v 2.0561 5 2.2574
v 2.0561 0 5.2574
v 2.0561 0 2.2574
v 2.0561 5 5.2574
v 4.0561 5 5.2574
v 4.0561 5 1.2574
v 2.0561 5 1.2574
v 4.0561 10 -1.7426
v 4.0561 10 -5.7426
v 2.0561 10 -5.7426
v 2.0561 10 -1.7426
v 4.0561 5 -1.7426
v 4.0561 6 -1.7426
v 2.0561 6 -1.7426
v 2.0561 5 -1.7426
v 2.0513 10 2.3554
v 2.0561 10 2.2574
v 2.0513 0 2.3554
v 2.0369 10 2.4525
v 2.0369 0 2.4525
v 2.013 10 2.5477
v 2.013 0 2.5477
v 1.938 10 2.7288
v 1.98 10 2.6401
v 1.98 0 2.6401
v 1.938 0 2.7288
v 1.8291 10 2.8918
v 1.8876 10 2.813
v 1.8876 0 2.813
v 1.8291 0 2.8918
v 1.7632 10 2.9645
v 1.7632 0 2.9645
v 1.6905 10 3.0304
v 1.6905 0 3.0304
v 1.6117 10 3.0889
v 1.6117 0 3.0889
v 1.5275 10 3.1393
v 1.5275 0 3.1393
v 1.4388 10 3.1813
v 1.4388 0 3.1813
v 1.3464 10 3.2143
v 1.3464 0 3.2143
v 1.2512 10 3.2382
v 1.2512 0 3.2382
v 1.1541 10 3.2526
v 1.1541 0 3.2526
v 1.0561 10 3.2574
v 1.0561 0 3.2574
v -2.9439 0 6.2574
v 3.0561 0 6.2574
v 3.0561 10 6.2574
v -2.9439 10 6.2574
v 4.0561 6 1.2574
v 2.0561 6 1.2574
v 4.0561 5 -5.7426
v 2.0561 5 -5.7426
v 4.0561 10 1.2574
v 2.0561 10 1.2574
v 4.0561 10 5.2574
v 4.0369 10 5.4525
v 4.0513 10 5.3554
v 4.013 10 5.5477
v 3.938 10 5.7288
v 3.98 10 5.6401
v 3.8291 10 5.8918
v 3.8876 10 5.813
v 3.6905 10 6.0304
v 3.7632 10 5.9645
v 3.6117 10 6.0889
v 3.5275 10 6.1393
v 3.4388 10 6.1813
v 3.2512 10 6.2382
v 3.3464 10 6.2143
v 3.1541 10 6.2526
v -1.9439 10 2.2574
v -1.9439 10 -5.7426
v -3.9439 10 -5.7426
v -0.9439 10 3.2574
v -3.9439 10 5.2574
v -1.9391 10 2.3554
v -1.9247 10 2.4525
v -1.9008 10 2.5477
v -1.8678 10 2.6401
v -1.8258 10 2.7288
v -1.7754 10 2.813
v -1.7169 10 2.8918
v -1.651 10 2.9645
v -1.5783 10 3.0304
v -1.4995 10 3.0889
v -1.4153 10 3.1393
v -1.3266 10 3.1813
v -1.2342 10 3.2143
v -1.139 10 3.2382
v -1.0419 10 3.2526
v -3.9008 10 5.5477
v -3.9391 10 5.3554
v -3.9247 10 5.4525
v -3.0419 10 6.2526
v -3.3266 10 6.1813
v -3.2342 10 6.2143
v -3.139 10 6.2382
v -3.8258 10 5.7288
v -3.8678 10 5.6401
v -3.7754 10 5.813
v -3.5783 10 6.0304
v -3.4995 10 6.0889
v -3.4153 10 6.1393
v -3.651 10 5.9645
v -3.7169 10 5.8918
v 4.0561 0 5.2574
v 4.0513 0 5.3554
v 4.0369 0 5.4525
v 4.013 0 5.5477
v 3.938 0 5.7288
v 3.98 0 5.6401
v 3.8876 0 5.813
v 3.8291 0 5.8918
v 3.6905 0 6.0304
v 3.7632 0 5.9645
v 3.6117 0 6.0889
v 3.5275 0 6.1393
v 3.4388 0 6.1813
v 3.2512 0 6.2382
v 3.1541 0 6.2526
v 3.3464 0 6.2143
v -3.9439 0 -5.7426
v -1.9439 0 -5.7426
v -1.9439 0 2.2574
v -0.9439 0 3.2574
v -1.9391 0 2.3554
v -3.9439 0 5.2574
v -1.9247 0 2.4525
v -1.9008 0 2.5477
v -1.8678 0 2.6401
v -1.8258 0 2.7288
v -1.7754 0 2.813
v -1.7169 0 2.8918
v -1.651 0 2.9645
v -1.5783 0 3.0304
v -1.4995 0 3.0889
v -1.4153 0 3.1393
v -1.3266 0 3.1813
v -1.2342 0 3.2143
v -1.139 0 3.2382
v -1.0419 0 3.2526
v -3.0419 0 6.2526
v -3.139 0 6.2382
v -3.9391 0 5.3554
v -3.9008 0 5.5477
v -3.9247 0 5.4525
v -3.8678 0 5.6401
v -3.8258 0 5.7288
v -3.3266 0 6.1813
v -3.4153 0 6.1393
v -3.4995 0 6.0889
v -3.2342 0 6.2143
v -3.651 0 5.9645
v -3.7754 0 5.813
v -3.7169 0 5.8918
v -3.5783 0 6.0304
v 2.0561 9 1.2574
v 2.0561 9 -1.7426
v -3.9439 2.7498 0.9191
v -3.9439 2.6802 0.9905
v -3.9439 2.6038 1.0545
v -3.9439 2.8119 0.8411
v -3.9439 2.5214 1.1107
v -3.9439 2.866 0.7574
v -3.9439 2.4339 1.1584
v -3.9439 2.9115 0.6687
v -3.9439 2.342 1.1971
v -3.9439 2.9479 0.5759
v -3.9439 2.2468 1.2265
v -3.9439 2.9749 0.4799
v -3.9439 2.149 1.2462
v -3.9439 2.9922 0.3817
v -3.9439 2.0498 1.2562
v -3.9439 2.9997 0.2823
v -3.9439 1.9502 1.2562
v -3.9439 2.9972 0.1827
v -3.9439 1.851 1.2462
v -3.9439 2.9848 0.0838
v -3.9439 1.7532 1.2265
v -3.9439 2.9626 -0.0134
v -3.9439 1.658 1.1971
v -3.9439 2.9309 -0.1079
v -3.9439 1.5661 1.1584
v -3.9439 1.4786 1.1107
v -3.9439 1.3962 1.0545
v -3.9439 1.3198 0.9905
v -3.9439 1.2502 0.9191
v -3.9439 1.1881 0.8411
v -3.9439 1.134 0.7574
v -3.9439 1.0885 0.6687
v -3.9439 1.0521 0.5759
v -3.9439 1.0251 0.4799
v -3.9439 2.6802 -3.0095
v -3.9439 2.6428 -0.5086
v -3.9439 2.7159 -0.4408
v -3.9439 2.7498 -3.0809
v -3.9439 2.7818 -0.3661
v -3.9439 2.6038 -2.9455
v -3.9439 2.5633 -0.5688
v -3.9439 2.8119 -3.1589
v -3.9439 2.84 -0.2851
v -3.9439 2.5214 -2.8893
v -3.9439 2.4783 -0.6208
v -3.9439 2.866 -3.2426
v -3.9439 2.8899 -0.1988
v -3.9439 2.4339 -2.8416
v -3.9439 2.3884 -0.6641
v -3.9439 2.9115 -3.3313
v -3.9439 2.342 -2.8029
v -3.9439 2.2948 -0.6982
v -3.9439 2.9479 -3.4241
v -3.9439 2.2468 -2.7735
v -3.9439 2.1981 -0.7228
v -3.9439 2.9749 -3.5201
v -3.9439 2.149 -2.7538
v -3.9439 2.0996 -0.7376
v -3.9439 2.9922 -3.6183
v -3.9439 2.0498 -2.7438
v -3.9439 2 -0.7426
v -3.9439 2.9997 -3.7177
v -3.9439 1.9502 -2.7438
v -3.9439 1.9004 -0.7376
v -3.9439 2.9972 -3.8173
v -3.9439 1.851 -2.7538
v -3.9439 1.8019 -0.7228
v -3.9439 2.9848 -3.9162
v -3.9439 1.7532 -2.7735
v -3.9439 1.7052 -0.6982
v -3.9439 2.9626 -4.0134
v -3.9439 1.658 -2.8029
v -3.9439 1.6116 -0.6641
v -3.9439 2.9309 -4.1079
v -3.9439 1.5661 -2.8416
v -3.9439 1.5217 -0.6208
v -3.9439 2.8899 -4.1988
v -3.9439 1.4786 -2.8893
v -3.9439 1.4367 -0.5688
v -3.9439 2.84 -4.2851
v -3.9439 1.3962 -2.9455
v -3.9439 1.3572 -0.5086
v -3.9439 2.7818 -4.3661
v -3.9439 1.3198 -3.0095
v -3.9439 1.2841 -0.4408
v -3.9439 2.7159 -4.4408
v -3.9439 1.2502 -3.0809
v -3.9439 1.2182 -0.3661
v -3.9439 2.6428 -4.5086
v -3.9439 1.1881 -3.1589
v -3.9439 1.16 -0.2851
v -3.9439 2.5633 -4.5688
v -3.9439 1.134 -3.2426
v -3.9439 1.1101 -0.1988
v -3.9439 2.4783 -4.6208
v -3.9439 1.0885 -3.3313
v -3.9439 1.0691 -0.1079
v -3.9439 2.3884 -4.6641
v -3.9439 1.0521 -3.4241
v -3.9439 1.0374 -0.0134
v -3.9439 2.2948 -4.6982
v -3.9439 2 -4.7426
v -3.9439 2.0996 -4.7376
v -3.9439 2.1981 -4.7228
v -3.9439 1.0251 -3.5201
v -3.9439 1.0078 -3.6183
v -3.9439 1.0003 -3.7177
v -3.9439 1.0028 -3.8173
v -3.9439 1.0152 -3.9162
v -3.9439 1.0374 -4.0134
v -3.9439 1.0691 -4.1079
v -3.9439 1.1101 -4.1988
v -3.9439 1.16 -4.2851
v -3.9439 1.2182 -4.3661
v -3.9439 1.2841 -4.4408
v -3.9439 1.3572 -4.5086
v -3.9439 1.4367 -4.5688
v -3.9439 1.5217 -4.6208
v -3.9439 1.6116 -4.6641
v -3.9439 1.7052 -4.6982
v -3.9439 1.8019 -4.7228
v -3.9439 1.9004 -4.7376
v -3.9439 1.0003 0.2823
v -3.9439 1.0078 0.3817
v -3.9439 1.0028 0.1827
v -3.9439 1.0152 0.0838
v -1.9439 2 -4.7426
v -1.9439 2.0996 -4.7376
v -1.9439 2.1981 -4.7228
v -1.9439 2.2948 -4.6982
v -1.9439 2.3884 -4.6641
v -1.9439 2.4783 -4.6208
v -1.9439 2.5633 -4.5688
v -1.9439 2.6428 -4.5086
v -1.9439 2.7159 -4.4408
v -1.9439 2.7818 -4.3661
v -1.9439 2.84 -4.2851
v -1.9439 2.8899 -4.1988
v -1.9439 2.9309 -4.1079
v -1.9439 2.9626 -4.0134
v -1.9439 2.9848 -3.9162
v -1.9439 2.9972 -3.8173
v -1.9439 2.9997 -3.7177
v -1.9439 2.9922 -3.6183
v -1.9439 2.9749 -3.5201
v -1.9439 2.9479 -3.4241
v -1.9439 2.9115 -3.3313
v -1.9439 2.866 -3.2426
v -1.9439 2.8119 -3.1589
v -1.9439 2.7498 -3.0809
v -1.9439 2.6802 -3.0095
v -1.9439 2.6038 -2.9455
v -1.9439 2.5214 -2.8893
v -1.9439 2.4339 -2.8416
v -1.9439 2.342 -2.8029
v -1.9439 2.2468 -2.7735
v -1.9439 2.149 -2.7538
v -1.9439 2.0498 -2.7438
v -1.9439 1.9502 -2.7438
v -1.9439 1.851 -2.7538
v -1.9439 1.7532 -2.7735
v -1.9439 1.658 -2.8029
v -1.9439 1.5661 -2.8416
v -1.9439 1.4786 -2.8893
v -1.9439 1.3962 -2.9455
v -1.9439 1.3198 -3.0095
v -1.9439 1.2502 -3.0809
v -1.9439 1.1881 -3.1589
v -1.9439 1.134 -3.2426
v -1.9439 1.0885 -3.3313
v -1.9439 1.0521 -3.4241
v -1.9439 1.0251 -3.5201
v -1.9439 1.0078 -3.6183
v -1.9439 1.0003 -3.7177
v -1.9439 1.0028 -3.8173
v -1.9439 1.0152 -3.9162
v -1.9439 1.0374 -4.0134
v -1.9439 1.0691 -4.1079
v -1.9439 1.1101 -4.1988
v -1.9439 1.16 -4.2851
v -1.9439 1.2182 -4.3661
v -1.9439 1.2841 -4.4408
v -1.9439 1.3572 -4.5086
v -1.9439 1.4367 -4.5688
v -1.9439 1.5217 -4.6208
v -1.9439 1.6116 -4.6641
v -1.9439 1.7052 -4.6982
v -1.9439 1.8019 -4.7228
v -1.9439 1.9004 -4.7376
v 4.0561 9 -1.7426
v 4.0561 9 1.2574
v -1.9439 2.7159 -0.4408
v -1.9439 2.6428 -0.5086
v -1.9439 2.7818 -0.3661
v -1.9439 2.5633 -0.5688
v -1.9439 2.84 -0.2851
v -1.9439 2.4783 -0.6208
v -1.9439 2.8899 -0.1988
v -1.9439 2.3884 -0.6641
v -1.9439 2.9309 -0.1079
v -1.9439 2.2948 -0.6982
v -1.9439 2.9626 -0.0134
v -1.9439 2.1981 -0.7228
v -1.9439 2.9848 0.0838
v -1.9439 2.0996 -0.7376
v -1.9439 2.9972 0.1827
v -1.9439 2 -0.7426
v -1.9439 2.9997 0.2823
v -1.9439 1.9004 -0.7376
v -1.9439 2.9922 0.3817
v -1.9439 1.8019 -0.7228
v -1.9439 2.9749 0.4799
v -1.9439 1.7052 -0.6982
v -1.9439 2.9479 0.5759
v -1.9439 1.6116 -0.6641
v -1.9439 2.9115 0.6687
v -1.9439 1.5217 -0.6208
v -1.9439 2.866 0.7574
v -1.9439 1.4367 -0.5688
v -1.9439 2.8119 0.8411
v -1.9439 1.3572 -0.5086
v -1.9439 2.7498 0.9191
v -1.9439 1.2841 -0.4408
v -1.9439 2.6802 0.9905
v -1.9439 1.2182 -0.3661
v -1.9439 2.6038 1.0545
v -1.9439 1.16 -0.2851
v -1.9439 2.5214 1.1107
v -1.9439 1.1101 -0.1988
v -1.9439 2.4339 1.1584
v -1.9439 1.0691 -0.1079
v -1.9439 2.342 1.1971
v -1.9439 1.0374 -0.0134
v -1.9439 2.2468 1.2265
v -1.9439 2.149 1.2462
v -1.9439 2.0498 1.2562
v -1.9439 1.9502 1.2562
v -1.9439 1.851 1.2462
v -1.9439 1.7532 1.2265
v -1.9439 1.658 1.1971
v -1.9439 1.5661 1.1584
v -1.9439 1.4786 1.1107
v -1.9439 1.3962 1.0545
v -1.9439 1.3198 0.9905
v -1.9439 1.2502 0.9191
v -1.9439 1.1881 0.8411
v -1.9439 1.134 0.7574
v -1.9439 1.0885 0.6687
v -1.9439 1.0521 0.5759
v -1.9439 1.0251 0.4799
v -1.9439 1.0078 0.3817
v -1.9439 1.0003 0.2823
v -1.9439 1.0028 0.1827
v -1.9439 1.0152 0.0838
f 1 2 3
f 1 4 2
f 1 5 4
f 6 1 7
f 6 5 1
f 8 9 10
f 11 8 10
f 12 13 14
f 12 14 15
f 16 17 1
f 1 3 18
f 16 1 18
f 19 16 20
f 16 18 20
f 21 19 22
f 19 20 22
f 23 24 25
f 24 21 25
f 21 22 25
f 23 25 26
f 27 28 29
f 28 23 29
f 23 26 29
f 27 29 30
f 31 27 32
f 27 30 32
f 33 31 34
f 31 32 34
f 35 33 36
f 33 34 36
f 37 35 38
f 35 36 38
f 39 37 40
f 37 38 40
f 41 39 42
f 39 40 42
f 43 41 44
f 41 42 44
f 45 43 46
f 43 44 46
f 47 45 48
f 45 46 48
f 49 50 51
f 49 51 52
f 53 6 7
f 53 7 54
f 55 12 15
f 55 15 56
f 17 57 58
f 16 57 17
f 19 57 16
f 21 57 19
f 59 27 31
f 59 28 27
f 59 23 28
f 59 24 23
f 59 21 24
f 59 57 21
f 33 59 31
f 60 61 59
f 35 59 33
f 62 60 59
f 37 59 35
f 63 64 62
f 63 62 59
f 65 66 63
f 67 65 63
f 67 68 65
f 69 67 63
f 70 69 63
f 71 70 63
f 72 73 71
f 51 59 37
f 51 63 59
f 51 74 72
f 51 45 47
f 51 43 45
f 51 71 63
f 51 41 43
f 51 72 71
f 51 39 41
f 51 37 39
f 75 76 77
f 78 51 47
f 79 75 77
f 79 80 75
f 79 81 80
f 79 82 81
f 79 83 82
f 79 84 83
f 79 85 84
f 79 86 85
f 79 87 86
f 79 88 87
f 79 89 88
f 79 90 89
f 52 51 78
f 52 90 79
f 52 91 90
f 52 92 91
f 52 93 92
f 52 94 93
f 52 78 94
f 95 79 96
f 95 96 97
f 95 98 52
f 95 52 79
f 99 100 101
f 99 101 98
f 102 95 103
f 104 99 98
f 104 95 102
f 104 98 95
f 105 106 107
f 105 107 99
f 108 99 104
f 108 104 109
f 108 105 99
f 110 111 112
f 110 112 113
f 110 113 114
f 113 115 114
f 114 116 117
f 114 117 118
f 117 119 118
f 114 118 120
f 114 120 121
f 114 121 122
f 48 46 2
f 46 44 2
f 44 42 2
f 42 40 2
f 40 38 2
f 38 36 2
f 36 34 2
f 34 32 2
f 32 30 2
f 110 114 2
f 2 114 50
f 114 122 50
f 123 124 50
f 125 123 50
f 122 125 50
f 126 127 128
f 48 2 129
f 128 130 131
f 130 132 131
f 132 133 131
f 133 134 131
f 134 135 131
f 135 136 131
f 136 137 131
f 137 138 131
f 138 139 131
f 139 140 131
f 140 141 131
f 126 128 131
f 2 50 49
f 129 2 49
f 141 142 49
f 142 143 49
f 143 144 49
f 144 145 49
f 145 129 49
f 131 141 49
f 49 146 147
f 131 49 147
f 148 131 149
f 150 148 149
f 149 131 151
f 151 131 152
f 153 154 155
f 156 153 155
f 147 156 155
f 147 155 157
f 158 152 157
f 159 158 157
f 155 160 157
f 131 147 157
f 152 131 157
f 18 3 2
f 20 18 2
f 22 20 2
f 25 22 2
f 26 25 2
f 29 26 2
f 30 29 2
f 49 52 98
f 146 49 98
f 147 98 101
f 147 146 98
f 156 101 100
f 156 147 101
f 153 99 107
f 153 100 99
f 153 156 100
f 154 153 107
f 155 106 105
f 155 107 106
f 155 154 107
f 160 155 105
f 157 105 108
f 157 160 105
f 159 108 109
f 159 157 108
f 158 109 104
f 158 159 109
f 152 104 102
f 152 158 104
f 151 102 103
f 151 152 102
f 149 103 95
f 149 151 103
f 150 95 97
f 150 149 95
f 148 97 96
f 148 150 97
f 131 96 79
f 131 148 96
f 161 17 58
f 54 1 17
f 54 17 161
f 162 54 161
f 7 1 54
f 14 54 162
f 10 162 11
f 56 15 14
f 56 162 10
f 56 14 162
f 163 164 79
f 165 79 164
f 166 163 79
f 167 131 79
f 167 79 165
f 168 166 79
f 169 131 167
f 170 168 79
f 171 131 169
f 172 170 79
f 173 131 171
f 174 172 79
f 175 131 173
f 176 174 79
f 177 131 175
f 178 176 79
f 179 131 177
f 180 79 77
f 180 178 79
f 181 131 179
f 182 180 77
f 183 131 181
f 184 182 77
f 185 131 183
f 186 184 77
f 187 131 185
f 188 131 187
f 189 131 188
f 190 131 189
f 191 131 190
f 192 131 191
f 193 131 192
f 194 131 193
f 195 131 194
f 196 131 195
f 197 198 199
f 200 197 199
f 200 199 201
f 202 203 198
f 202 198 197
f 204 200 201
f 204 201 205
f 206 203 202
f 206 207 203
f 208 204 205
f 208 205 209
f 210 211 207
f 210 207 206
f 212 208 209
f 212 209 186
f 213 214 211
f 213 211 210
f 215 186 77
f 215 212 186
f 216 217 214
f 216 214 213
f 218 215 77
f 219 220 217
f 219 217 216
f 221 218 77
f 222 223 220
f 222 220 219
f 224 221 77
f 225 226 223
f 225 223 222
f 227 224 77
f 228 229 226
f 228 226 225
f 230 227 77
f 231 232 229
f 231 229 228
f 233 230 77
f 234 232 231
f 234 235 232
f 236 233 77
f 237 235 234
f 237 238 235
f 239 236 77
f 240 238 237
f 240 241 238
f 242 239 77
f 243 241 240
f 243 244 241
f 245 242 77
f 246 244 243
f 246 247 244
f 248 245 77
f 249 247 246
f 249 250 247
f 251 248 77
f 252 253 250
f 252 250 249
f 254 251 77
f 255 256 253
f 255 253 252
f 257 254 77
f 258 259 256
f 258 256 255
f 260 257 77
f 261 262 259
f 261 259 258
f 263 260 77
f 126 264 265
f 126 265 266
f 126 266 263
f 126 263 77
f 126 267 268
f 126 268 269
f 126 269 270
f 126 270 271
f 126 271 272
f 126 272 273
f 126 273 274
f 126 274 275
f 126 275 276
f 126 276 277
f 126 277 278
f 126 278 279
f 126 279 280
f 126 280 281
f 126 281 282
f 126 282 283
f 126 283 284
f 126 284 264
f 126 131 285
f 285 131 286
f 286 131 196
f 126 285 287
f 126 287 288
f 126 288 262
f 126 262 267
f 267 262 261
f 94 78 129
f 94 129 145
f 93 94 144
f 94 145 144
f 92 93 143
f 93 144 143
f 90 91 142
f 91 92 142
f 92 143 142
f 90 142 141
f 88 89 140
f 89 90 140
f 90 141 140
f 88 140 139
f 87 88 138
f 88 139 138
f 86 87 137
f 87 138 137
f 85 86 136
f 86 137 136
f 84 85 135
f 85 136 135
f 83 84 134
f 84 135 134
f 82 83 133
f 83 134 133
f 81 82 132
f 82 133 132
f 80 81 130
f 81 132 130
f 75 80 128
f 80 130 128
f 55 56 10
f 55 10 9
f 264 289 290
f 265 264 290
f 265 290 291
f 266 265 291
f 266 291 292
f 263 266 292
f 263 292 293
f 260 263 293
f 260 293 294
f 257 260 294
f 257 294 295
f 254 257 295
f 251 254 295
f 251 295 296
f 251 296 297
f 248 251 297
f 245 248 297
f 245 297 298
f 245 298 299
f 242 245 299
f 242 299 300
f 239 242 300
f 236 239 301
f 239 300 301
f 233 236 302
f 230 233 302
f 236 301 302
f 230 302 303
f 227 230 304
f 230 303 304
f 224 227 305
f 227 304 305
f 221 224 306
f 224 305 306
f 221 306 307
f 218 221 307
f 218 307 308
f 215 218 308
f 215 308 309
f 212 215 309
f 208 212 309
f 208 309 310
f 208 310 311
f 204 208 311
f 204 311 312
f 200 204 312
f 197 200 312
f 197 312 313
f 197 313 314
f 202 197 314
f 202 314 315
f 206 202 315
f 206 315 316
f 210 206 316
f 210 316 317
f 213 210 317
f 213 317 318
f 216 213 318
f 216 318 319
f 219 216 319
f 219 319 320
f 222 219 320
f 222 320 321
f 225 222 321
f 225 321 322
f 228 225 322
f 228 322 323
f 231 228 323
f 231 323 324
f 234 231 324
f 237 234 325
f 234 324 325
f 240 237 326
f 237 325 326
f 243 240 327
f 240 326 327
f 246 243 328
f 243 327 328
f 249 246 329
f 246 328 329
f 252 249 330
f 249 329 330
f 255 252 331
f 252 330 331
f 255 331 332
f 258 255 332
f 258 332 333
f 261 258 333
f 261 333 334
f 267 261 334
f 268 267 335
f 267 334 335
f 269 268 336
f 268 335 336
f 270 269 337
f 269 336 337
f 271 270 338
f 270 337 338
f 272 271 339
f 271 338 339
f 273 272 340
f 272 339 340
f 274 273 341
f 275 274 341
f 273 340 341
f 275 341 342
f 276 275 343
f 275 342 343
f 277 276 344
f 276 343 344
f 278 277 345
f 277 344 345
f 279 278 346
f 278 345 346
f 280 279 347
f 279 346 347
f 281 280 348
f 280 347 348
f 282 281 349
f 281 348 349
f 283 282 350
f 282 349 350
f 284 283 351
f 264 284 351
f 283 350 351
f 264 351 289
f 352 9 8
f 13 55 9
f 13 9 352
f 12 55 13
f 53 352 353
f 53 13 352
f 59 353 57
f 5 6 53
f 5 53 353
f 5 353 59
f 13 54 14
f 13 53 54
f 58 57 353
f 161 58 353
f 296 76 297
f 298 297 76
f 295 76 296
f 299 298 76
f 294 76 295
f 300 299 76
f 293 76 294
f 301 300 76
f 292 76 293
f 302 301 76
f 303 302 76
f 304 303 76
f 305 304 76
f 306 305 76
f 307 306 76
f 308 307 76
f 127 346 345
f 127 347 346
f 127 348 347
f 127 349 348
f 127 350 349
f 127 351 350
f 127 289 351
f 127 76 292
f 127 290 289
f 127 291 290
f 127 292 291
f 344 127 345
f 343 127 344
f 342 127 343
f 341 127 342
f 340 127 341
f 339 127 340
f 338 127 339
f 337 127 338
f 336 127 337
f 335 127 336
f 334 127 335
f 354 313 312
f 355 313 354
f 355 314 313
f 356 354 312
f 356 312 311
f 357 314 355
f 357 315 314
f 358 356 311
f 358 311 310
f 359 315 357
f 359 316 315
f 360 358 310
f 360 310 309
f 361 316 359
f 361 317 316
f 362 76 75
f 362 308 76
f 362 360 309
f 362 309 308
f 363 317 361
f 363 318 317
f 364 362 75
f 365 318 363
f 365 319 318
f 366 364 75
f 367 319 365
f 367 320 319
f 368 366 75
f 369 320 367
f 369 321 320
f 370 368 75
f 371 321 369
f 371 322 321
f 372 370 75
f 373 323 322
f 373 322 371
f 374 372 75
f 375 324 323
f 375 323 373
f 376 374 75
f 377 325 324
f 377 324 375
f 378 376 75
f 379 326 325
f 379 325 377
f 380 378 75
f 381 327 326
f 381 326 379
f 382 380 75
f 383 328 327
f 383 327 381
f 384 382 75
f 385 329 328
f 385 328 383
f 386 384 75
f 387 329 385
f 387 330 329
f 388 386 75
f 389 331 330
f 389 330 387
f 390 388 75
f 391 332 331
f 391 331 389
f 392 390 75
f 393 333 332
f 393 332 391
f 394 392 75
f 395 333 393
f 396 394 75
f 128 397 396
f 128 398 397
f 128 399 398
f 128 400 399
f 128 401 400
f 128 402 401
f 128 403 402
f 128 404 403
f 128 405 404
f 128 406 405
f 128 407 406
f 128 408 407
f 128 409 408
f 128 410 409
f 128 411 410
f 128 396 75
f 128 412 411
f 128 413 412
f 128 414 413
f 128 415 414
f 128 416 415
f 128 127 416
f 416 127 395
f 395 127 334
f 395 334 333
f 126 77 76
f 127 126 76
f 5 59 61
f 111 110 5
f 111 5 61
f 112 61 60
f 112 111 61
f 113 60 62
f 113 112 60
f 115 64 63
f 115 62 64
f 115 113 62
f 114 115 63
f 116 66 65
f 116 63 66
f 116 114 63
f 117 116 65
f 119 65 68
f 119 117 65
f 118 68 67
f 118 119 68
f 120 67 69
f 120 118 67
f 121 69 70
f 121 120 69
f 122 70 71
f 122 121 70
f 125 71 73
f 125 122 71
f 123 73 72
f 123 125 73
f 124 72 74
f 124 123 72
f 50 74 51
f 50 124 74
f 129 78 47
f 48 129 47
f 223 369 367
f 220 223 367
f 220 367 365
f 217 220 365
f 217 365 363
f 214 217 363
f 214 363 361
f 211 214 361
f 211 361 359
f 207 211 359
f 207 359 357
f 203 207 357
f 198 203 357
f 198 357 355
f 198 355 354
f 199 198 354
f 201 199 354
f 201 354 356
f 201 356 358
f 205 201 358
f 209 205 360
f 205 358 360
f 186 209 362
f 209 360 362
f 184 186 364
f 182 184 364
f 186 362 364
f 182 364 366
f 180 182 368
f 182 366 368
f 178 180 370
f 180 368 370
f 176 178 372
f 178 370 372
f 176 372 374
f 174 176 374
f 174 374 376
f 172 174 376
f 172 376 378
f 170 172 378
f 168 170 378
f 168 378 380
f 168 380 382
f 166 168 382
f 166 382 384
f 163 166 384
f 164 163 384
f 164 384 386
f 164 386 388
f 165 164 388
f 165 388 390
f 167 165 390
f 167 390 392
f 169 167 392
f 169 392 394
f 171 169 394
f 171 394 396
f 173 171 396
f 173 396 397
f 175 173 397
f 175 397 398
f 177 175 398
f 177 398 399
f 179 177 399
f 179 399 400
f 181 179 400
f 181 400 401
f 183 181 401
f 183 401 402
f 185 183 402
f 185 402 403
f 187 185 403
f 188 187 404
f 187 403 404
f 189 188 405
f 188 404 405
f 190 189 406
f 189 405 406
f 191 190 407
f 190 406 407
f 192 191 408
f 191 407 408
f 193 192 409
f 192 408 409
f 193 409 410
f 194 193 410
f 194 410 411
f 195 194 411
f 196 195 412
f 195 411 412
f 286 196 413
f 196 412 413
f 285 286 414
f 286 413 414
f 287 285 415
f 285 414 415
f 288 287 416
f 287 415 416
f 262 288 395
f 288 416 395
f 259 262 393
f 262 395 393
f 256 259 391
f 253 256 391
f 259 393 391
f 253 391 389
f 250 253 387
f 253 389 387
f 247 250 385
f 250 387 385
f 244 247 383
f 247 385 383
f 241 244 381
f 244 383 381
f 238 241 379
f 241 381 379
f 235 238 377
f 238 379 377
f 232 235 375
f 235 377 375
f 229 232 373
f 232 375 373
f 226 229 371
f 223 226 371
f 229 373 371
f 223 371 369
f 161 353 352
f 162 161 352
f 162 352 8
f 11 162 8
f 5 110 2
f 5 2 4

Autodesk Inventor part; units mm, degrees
ref_plane "YZ Plane" through (0, 0, 0) normal (1, 0, 0) x (0, 1, 0)
ref_plane "XZ Plane" through (0, 0, 0) normal (0, 1, 0) x (-1, 0, 0)
ref_plane "XY Plane" through (0, 0, 0) normal (0, 0, 1) x (1, 0, 0)
sketch "Sketch1" plane through (0, 0, 0) normal (0, 1, 0) x (-1, 0, 0)
  line L0 (-4.0561, -5.7426) -> (-4.0561, 5.2574)
  line L1 (-3.0561, 6.2574) -> (2.9439, 6.2574)
  line L2 (3.9439, 5.2574) -> (3.9439, -5.7426)
  line L3 (3.9439, -5.7426) -> (1.9439, -5.7426)
  line L4 (1.9439, -5.7426) -> (1.9439, 2.2574)
  line L5 (0.9439, 3.2574) -> (-1.0561, 3.2574)
  line L6 (-2.0561, 2.2574) -> (-2.0561, -5.7426)
  line L7 (-2.0561, -5.7426) -> (-4.0561, -5.7426)
  arc A0 (-1.0561, 3.2574) -> (-2.0561, 2.2574) centre (-1.0561, 2.2574) ccw
  arc A1 (1.9439, 2.2574) -> (0.9439, 3.2574) centre (0.9439, 2.2574) ccw
  arc A2 (-3.0561, 6.2574) -> (-4.0561, 5.2574) centre (-3.0561, 5.2574) ccw
  arc A3 (3.9439, 5.2574) -> (2.9439, 6.2574) centre (2.9439, 5.2574) ccw
  point P0 (0, 0)
  point P1 (-4.0561, 6.2574)
  point P2 (3.9439, 6.2574)
  point P3 (1.9439, 3.2574)
  point P4 (-2.0561, 3.2574)
  dimension "d0" = 12
  dimension "d1" = 2
  dimension "d2" = 2
  dimension "d3" = 8
  dimension "d4" = 3
  dimension "d20" = 1
extrude "Extrusion1" add sketch "Sketch1" along normal blind 10
sketch "Sketch6" plane through (-1.9439, 0, 2.2574) normal (1, 0, 0) x (0, 0, -1)
  circle A0 centre (2, 2) radius 1
  circle A1 centre (6, 2) radius 1
  line L0 (8, 0) -> (8, 10) projected
  line L1 (0, 10) -> (8, 10) projected
  line L2 (8, 0) -> (0, 0) projected
  point P0 (2.2574, 0)
  dimension "d44" = 2
  dimension "d45" = 2
  dimension "d46" = 2
  dimension "d47" = 6
  dimension "d52" = 2
  dimension "d53" = 2
extrude "Extrusion6" cut sketch "Sketch6" against normal up to next
sketch "Sketch7" plane through (4.0561, 0, 5.2574) normal (1, 0, 0) x (0, 0, -1)
  line L0 (4, 10) -> (4, 9)
  line L1 (4, 9) -> (7, 9)
  line L2 (7, 9) -> (7, 10)
  line L3 (0, 10) -> (11, 10) projected
  line L4 (11, 0) -> (11, 10) projected
  line L5 (0, 0) -> (0, 10) projected
  line L6 (4, 10) -> (7, 10)
  point P0 (5.2574, 0)
  dimension "d54" = 4
  dimension "d55" = 4
  dimension "d57" = 1
extrude "Extrusion7" cut sketch "Sketch7" against normal up to next
sketch "Sketch8" plane through (4.0561, 0, 5.2574) normal (1, 0, 0) x (0, 0, -1)
  line L0 (0, 0) -> (0, 10) projected
  line L1 (0, 5) -> (4, 5)
  line L2 (4, 5) -> (4, 6)
  line L3 (4, 6) -> (7, 6)
  line L4 (7, 6) -> (7, 5)
  line L5 (7, 5) -> (11, 5)
  line L6 (11, 0) -> (11, 10) projected
  line L7 (11, 5) -> (11, 0)
  line L8 (11, 0) -> (0, 0)
  line L9 (0, 0) -> (0, 5)
  point P0 (5.2574, 0)
  dimension "d60" = 5
  dimension "d61" = 1
  dimension "d62" = 4
  dimension "d63" = 4
extrude "Extrusion8" cut sketch "Sketch8" against normal up to surface (2 mm away)
properties part number "crochet"
